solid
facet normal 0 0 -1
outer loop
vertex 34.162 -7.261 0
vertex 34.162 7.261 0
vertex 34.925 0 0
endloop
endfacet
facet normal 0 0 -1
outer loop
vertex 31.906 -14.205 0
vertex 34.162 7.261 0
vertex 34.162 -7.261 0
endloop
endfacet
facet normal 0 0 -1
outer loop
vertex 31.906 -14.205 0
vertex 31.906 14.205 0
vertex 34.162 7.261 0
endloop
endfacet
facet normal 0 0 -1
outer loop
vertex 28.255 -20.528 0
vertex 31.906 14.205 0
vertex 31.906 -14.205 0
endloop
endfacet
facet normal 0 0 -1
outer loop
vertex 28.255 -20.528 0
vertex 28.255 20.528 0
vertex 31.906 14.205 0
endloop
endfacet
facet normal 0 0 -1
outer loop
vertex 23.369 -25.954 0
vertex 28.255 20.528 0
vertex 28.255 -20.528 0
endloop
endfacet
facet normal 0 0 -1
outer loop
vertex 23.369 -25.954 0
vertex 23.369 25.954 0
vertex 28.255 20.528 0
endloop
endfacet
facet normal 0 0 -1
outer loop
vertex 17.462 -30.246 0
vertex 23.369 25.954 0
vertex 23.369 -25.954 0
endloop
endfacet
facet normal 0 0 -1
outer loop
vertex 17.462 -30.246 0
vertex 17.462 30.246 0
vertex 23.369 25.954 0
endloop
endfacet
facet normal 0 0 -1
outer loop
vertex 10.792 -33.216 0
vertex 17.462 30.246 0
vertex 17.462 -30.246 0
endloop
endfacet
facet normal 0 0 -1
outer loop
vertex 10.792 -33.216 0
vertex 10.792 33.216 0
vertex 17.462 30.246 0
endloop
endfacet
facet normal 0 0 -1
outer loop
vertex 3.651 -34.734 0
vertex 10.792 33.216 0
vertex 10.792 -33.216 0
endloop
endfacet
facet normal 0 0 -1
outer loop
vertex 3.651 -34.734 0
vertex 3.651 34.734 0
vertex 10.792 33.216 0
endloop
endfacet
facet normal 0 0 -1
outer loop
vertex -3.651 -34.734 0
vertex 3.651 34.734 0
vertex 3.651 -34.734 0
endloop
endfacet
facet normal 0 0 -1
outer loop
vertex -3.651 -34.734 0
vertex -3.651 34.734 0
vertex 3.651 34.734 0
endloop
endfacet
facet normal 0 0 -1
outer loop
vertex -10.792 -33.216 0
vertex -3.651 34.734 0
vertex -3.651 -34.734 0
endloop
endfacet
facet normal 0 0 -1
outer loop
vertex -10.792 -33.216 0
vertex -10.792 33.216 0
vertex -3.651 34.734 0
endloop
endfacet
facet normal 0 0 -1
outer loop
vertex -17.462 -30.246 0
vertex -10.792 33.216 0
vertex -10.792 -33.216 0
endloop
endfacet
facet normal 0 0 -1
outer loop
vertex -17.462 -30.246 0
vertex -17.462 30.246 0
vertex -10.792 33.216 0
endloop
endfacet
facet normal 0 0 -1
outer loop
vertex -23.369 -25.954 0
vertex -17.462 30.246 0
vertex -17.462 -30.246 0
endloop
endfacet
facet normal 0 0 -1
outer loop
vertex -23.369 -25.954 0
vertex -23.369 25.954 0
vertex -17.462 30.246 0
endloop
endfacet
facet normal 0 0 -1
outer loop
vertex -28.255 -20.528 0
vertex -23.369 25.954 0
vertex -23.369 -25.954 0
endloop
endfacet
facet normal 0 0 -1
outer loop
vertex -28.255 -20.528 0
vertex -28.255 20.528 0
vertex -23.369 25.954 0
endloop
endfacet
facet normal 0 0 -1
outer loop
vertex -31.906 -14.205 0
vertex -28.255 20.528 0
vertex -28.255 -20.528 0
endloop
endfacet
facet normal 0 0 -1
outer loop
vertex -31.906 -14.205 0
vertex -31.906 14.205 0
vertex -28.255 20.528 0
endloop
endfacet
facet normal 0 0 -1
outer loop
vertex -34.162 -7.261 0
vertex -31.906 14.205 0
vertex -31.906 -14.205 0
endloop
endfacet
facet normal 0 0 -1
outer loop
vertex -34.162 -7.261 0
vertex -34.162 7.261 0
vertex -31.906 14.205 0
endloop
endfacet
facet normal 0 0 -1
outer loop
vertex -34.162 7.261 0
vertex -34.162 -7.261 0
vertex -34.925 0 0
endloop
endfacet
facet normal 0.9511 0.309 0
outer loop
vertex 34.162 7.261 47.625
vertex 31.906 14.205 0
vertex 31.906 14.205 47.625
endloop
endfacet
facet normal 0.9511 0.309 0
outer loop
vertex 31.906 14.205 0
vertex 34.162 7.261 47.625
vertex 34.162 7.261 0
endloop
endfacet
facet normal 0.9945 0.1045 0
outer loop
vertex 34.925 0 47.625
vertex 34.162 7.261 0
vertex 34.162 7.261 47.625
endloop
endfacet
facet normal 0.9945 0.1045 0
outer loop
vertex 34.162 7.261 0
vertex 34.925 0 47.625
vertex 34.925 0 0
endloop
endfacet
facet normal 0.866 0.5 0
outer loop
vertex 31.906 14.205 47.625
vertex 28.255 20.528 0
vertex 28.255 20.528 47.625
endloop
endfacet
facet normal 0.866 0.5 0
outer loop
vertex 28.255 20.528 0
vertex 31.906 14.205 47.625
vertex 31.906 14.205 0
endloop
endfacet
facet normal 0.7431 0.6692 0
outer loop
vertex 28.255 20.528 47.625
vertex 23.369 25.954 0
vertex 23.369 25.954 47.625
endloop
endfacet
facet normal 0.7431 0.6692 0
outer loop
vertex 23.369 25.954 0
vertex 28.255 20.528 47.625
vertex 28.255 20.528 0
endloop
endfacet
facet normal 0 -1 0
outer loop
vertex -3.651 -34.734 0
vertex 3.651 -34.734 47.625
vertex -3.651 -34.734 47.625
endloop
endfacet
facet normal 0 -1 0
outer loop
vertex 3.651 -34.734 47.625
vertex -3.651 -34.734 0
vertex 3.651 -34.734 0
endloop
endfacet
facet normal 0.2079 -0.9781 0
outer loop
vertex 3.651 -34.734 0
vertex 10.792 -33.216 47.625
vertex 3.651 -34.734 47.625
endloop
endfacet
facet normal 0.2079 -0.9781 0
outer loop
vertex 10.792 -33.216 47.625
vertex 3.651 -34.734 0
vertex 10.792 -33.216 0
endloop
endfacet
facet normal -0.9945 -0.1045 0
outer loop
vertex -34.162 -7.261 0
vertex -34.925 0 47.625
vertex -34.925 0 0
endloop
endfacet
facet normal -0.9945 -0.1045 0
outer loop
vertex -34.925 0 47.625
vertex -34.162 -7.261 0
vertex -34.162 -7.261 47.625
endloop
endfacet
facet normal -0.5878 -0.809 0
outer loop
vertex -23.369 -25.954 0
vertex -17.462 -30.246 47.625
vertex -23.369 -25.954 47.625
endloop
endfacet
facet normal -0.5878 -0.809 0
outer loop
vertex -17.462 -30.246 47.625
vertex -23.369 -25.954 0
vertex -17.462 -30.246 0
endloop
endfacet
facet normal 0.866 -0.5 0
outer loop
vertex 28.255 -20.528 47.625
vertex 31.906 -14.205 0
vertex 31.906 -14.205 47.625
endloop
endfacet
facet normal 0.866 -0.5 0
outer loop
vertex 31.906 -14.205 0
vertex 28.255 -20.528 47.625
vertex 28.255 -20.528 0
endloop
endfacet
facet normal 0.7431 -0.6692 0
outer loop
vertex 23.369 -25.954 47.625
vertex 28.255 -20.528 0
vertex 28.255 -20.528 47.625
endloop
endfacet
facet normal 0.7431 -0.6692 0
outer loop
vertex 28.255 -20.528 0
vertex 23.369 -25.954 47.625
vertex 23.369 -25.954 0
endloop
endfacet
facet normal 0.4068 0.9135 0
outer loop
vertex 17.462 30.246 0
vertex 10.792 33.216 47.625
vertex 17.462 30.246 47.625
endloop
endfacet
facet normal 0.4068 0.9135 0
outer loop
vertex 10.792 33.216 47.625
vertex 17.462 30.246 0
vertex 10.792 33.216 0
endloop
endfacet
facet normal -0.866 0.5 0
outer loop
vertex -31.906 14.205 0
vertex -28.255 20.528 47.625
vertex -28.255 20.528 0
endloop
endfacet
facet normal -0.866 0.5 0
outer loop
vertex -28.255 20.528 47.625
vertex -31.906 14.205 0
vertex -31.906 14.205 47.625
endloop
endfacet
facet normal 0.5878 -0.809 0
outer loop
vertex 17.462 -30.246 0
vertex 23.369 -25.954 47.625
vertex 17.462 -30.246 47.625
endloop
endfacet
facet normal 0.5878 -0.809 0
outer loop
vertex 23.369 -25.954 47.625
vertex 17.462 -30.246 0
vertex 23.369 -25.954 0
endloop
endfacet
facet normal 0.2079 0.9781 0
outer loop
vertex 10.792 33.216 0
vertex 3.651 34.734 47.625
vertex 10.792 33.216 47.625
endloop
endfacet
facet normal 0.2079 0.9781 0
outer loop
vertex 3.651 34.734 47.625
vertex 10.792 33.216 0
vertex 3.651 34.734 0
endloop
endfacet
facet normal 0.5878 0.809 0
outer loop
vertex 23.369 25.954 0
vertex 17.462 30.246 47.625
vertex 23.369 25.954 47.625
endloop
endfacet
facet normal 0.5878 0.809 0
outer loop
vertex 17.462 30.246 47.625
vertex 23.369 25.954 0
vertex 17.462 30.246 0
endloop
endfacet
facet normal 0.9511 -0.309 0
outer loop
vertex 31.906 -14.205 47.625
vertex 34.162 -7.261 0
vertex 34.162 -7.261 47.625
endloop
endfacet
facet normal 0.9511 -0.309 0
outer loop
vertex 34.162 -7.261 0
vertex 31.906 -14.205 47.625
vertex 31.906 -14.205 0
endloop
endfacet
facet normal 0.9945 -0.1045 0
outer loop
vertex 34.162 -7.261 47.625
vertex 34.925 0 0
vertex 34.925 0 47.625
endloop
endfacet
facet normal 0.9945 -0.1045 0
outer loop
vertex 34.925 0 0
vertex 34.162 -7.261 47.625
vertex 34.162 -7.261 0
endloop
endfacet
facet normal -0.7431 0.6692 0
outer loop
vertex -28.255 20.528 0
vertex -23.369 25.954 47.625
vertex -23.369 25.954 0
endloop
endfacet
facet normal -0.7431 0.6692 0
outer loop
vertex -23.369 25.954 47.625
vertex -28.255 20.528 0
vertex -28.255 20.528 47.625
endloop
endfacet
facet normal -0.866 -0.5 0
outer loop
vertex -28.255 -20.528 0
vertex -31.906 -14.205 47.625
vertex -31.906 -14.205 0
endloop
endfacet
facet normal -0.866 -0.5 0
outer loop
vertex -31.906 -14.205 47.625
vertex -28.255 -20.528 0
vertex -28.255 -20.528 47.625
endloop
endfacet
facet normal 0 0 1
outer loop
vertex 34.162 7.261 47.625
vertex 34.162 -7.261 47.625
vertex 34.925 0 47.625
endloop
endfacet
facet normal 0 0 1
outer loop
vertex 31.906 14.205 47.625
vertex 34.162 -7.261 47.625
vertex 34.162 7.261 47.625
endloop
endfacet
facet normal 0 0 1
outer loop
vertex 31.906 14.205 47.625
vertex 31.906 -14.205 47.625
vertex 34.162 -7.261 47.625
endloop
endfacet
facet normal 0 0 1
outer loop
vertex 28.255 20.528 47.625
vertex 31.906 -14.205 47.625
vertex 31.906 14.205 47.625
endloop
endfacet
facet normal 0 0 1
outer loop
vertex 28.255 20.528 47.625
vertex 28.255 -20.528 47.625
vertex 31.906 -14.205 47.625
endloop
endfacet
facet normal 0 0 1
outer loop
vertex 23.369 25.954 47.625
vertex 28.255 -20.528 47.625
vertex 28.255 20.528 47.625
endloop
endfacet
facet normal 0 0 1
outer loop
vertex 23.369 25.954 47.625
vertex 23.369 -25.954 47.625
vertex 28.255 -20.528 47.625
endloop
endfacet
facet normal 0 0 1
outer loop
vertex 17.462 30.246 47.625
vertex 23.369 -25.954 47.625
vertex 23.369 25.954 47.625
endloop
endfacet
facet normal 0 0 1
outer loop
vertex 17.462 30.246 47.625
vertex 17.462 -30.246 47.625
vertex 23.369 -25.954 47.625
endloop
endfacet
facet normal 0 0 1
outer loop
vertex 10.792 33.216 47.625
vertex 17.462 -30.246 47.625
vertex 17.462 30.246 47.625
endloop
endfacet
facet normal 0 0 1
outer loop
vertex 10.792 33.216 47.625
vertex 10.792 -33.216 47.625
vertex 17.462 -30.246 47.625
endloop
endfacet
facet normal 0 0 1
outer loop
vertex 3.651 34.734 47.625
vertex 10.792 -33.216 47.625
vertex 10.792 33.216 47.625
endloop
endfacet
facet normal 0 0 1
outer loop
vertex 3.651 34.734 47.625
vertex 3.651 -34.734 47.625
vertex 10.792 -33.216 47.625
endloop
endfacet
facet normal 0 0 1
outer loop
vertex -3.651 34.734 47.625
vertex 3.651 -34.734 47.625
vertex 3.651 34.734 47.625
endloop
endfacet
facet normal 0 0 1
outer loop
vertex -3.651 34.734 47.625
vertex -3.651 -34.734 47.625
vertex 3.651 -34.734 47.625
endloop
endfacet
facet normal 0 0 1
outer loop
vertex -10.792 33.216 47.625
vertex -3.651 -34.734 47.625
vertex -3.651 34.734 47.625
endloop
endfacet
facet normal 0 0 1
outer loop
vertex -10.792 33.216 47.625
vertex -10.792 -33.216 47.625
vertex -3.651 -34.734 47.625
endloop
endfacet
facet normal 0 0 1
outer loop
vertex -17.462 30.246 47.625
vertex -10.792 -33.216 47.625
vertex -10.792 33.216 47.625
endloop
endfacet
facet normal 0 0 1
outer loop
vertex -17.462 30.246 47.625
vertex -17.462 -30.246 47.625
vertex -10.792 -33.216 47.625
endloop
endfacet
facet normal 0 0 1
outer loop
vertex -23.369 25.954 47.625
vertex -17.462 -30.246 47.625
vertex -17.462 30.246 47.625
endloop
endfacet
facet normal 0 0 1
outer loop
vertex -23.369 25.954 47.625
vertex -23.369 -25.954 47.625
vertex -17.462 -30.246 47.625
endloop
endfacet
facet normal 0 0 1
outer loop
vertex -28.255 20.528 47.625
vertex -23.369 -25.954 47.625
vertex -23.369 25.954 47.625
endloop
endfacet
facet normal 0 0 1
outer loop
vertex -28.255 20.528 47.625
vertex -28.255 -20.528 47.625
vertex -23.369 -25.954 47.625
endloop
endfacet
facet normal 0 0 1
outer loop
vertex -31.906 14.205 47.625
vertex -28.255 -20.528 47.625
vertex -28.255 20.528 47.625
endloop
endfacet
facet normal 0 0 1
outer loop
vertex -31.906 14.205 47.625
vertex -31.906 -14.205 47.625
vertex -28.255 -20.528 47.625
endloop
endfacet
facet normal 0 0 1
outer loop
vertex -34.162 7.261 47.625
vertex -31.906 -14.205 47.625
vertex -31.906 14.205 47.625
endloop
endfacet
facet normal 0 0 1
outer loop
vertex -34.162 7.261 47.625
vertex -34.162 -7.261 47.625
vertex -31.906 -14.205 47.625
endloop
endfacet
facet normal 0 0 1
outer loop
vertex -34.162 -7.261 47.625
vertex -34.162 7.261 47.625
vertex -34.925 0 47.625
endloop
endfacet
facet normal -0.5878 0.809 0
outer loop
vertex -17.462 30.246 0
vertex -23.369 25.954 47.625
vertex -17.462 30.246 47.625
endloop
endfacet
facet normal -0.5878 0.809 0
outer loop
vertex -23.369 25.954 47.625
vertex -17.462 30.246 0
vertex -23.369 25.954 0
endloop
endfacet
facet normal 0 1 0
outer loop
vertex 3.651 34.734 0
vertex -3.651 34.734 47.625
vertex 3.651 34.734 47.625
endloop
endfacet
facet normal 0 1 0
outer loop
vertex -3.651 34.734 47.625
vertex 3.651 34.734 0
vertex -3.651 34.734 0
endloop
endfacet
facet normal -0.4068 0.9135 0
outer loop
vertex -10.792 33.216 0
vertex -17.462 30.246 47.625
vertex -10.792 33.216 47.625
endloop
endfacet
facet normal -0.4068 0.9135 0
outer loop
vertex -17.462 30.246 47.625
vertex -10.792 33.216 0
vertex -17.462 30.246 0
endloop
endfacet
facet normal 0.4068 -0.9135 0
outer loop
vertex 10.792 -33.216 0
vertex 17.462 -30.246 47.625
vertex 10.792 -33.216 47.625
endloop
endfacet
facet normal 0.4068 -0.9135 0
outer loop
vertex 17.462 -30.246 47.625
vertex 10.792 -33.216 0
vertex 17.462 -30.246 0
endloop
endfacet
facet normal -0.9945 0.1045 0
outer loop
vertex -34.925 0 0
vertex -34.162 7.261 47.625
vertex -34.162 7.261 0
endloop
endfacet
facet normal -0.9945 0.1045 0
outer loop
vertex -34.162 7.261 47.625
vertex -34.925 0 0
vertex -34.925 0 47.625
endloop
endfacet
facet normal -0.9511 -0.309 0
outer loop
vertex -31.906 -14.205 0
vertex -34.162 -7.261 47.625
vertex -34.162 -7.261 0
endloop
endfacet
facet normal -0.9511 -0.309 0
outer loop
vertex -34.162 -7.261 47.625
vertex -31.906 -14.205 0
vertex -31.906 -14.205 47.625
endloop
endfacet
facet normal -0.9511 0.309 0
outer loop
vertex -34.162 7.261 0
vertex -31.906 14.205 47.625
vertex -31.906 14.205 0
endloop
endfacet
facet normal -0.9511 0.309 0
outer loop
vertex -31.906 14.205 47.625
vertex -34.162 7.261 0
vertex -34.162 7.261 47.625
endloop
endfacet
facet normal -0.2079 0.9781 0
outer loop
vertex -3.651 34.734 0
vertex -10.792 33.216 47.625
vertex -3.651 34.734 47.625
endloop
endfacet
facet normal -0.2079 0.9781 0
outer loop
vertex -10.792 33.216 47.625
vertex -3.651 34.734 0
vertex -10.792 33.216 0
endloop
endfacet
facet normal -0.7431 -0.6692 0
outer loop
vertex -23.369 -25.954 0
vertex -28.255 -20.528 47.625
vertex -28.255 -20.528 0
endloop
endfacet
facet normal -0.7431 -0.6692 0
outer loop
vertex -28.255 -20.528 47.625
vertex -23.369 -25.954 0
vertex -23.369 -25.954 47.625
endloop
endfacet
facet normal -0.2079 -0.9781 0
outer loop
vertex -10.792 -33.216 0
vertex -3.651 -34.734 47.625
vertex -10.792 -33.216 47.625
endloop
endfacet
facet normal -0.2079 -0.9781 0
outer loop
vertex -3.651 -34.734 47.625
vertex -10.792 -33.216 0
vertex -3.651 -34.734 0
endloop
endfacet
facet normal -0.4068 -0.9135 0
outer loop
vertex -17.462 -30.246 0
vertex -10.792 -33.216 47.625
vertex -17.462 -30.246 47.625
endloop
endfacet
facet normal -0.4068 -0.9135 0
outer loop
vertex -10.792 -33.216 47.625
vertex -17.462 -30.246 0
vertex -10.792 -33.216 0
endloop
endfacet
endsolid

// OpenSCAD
// file: ../parameters/lightswitch_parameters.scad
// This is a light switch plate parameterized on how many light switches the plate has.
numberOfSwitches = 2;

// These parameters shouldn't change, but are the measurements in inches of the various lengths on a standard light switch.
plateToEdgeSwitchInches = 1.375;
switchToSwitchInches = 1.875;
switchHeightInches = 1;
switchWidthInches = 3/8;
verticalScrewDistanceInches = 2.375;
plateHeightInches = 4.5;
screwDiameterInches = 3/16;

// These are the parameters converted into the metric units used by OpenSCAD
inchesToMm = 25.4;
plateToEdgeSwitch = plateToEdgeSwitchInches * inchesToMm;
switchToSwitch = switchToSwitchInches * inchesToMm;
switchHeight = switchHeightInches * inchesToMm;
switchWidth = switchWidthInches * inchesToMm;
verticalScrewDistance = verticalScrewDistanceInches * inchesToMm;
plateHeight = plateHeightInches * inchesToMm;
screwDiameter = screwDiameterInches * inchesToMm;

// Undefined parameters that I'm guessing at
plateDepth = 1;

// These are the rough millimeter measurements of a light switch.
switchLength = 6.5;
switchDepth = 14;

// These are the rough dimensions of a light switch screw.
screwLength = 13.85;
screwHeadRadius = 6.9/2;
screwHeadHeight = 2.3;
screwBodyRadius = 3.42/2;

switchRotationMultiplier = 30; // This is a multiplier used to get the actual angle of the switches in the switch assembly. It is multiplied by the -1 to 1 angle parameter of the light switch module.

screwVerticalDistanceFromEdge = (plateHeight-verticalScrewDistance)/2;
// main file
include <../parameters/lightswitch_parameters.scad>

module lightswitch_screw(screwLength = screwLength, screwHeadRadius = screwHeadRadius, screwHeadHeight = screwHeadHeight, screwBodyRadius = screwBodyRadius){
    union(){
        cylinder(h=screwLength, r=screwBodyRadius);
        cylinder(h=screwHeadHeight, r=screwHeadRadius);
    }
}

lightswitch_screw(numberOfSwitches, plateToEdgeSwitch, switchToSwitch, switchHeight, switchWidth, verticalScrewDistance, plateHeight, plateDepth, screwDiameter);
